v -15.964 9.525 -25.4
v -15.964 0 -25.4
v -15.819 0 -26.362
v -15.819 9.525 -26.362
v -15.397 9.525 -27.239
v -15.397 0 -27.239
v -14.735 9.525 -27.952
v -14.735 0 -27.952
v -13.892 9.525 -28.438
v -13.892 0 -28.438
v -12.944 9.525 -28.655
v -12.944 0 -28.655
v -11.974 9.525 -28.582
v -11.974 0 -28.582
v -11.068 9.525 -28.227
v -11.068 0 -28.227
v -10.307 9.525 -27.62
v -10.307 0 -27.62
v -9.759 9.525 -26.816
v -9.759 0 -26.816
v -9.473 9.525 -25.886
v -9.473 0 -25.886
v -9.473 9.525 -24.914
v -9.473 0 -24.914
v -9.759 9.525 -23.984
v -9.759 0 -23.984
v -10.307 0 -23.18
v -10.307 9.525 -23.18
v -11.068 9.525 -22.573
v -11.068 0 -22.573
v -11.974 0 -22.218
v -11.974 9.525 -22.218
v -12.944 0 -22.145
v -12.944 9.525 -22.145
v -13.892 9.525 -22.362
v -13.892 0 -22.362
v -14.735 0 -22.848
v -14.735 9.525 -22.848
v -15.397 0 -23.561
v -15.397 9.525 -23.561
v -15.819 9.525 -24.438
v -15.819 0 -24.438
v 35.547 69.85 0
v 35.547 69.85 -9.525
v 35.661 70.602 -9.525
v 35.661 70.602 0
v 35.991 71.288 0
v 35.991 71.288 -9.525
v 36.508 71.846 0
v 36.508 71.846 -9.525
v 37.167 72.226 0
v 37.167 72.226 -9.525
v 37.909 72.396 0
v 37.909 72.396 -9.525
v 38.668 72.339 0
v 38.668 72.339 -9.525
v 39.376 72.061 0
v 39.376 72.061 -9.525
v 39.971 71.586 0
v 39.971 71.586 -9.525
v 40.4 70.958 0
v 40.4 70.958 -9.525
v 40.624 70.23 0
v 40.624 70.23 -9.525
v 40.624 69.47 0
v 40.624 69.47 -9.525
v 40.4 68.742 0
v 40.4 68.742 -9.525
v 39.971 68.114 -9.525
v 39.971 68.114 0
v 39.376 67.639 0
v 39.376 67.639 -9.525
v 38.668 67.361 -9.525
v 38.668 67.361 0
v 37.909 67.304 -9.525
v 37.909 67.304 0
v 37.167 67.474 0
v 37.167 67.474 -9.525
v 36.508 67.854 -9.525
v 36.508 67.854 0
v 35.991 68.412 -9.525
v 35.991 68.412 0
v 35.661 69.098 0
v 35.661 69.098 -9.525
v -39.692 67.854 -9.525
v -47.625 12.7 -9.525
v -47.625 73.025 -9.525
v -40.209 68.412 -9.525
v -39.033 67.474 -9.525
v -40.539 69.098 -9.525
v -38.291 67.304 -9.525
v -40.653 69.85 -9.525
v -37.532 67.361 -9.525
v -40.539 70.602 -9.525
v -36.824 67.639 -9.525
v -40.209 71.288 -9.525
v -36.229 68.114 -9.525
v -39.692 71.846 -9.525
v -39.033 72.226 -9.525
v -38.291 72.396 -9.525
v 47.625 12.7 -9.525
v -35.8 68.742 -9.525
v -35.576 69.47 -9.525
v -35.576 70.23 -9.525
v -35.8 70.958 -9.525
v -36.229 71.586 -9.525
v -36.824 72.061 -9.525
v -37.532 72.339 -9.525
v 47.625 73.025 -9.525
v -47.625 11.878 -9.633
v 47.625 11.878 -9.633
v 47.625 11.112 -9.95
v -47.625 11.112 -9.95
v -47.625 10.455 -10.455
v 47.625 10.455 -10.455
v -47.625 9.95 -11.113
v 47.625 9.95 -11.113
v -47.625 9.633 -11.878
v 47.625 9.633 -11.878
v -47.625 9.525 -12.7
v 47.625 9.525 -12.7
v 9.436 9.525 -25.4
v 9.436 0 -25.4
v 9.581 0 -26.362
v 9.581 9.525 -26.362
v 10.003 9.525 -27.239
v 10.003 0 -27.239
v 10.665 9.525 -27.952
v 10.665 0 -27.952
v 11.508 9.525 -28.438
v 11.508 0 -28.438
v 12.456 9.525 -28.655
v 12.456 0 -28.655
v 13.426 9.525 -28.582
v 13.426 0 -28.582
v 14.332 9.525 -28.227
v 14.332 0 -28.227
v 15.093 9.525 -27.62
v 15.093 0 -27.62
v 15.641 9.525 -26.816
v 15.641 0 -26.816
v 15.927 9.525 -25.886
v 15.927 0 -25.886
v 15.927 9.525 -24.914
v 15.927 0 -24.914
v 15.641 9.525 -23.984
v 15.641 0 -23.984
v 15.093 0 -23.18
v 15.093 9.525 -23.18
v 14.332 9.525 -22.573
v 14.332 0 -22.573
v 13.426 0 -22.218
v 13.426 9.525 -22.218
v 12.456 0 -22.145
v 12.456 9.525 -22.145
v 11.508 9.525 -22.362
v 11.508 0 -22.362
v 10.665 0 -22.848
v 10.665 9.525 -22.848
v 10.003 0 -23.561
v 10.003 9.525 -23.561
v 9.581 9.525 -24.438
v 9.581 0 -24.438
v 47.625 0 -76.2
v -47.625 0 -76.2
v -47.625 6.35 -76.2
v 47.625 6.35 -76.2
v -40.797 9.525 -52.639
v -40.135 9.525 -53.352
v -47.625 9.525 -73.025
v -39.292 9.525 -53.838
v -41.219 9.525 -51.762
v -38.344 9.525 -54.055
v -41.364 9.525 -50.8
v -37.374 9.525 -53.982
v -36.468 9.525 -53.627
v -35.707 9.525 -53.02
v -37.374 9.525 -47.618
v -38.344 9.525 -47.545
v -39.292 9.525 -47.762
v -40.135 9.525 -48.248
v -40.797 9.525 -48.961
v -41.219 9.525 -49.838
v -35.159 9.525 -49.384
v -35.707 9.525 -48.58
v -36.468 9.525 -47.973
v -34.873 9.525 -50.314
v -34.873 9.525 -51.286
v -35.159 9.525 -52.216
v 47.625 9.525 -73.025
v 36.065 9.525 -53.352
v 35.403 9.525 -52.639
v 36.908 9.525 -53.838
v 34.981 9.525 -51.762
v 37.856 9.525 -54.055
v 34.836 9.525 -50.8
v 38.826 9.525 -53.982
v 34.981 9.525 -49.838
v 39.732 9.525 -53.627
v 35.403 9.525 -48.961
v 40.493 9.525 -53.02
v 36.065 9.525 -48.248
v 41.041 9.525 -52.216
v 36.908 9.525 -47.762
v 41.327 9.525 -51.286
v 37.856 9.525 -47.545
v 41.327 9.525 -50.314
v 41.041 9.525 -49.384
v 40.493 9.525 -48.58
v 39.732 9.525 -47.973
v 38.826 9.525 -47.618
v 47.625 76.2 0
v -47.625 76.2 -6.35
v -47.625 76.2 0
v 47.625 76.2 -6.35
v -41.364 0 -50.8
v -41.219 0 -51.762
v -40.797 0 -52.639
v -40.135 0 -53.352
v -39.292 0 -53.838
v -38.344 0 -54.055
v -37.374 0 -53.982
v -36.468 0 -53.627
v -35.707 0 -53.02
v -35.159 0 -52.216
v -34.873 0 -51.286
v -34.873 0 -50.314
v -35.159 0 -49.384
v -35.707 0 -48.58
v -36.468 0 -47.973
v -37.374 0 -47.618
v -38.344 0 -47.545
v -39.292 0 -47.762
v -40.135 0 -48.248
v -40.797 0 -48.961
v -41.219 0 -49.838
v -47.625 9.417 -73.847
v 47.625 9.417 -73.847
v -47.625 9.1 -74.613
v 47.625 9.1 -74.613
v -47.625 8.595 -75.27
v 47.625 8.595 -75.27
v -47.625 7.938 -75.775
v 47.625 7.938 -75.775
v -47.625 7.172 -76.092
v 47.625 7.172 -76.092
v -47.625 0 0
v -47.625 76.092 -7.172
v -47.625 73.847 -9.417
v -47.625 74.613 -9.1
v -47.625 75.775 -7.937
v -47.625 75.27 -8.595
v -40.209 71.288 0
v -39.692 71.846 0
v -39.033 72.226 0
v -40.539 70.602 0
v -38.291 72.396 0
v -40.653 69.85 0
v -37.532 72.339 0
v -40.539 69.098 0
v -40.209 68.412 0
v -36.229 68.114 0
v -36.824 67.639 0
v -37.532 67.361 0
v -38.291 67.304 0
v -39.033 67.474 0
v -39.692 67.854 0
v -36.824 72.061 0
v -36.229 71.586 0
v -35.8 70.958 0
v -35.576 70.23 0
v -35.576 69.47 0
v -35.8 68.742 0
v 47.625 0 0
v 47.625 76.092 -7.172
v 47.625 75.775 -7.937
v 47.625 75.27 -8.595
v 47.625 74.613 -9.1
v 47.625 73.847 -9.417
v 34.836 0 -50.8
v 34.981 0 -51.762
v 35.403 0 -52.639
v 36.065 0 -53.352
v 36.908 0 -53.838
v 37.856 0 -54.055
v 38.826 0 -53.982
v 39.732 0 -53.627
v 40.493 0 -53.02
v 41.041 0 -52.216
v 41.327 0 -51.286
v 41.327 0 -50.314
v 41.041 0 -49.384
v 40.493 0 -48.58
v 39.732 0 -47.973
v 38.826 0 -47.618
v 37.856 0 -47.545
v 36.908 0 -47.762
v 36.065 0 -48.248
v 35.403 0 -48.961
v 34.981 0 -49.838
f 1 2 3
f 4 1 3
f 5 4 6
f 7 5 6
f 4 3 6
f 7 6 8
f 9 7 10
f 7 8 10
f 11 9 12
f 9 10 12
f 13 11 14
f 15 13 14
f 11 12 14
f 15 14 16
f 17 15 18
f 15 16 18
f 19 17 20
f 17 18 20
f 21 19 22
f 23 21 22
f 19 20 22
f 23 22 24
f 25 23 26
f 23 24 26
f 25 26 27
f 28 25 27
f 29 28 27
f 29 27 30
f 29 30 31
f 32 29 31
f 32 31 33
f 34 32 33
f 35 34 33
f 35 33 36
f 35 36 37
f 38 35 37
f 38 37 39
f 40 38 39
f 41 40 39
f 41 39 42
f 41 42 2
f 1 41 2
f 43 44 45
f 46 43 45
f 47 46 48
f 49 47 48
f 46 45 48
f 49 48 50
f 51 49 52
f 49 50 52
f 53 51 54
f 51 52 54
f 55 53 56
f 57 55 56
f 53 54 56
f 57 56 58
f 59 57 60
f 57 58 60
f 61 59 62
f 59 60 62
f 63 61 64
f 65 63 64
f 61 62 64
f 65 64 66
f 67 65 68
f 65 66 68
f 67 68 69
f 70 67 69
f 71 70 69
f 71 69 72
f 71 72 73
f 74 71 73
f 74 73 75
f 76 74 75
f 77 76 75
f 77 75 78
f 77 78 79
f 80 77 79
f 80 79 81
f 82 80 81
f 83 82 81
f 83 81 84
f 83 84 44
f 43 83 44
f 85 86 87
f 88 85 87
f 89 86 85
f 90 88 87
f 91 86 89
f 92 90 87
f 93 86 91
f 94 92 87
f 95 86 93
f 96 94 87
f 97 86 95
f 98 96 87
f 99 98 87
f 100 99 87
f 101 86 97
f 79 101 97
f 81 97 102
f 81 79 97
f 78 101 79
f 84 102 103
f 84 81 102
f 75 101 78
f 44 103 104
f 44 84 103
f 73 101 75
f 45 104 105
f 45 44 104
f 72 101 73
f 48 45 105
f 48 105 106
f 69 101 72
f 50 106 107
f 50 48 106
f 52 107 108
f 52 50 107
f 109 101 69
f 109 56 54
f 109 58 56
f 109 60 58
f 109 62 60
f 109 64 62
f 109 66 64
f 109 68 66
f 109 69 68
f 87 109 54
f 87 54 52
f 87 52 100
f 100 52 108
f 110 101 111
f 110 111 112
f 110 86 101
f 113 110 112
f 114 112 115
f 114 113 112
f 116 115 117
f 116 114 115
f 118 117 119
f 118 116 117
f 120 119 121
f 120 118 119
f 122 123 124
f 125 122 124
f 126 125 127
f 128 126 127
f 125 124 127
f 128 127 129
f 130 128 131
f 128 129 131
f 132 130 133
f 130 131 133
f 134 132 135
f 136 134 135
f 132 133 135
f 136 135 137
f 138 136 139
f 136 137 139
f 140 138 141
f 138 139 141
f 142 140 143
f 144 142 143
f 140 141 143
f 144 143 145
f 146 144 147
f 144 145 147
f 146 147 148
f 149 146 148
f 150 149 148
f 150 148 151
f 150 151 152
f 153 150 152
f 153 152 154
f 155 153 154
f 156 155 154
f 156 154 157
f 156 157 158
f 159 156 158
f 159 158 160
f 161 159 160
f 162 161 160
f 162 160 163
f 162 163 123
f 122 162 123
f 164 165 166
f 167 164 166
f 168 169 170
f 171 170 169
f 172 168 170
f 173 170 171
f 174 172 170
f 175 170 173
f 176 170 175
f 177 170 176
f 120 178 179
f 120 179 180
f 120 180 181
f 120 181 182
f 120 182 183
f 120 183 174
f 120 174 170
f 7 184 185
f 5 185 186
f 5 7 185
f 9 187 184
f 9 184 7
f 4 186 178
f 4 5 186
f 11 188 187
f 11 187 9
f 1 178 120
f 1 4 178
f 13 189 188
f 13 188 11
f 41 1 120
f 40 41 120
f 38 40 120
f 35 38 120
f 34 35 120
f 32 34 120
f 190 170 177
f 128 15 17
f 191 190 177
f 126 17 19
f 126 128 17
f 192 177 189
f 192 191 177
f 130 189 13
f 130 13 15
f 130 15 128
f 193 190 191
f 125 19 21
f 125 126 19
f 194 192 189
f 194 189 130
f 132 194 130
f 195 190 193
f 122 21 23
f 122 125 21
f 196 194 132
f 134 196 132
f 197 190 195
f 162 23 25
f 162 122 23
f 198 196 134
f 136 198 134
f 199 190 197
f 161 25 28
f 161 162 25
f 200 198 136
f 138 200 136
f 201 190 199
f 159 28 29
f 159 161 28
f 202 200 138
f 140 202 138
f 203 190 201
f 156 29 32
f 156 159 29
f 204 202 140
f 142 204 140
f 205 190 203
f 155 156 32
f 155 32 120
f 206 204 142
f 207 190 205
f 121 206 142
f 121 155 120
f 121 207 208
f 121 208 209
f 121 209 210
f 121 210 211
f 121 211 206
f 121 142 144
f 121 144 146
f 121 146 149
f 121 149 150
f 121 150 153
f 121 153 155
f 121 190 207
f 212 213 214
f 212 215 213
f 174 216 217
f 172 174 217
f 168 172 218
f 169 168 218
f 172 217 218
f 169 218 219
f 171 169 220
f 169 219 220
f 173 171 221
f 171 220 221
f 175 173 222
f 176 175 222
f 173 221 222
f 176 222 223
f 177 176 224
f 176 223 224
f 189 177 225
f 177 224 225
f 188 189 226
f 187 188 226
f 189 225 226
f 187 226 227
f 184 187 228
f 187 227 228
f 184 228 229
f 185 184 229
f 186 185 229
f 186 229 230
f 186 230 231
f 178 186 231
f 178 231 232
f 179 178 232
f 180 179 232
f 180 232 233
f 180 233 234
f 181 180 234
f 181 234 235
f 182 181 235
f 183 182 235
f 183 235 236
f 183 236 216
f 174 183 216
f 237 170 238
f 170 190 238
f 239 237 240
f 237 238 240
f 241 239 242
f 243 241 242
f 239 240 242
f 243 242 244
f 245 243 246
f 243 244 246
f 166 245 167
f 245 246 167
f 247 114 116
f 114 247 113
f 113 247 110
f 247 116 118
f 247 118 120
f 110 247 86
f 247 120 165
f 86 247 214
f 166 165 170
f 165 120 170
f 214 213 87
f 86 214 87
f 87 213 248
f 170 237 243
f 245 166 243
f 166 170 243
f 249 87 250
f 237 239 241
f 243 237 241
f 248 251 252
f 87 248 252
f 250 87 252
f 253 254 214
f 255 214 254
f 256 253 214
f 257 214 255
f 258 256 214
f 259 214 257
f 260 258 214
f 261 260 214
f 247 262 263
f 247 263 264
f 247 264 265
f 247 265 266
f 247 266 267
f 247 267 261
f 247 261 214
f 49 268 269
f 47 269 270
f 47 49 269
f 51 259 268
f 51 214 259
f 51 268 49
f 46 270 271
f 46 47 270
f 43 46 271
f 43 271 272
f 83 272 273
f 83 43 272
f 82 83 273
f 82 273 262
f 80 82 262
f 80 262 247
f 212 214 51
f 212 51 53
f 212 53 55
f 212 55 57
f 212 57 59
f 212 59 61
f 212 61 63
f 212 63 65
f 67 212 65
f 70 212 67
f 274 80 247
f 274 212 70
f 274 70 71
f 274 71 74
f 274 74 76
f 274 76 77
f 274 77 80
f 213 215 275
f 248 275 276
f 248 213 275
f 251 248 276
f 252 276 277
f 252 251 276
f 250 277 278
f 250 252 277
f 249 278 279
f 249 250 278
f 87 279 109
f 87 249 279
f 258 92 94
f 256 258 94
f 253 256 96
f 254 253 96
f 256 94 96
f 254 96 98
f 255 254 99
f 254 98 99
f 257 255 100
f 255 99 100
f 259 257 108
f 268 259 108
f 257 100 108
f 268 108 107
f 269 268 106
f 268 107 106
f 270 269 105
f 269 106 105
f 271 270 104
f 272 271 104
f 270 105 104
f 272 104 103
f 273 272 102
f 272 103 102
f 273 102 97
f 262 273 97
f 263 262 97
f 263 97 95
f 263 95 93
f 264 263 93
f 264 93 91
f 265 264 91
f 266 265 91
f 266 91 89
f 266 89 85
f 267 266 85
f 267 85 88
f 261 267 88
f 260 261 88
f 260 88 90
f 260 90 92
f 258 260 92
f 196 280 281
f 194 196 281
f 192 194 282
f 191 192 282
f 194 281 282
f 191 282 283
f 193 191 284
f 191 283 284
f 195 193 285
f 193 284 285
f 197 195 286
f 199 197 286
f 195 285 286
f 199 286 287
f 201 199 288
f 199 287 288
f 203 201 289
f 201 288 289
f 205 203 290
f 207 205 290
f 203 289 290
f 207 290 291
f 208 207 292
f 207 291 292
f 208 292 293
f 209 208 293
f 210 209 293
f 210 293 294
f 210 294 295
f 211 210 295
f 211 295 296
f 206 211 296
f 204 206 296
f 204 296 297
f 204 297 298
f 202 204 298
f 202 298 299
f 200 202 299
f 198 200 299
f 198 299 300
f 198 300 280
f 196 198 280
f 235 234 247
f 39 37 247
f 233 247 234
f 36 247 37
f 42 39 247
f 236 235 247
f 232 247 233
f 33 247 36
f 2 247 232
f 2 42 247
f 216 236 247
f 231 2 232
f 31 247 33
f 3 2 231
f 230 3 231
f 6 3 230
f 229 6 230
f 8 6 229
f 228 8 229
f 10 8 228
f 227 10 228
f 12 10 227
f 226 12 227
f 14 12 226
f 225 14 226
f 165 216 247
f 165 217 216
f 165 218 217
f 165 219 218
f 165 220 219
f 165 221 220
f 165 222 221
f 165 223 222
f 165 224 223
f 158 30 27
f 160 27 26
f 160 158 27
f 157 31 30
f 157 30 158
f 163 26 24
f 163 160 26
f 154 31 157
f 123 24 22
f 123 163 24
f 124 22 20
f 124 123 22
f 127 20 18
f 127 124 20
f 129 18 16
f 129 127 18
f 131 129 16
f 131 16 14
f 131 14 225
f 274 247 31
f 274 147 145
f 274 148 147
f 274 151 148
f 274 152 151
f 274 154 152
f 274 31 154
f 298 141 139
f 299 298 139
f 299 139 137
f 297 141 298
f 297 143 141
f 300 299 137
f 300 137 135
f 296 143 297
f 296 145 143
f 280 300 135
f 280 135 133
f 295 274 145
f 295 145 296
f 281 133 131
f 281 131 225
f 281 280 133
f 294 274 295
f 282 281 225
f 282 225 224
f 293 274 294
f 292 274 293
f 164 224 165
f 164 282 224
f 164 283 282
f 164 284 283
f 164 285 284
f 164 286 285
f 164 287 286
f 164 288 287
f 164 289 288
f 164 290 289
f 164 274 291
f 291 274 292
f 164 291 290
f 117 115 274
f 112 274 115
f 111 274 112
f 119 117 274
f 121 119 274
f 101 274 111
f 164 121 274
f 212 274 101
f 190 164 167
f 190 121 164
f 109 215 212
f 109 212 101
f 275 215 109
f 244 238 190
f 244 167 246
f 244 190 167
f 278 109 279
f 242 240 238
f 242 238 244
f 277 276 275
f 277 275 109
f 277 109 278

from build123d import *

# Parameters (mm, degrees)
BOSS_EXTRUDE1_DEPTH     = 47.625
FILLET1_R               = 3.175
F_1_4_20_TAPPED_HOLE1_D = 5.1054
F_1_4_CLEARANCE_HOLE1_D = 6.5278


with BuildPart() as part:
    # Sketch1 → Boss-Extrude1 (new, symmetric)
    with BuildSketch(Plane(origin=(0, 0, 0), x_dir=(0, 0, -1), z_dir=(1, 0, 0))):
        Polygon((0, 76.2), (0, 0), (76.2, 0), (76.2, 9.525), (9.525, 9.525), (9.525, 76.2), align=None)
    extrude(amount=BOSS_EXTRUDE1_DEPTH, both=True)

    # Fillet1
    fillet1_edges = [part.edges().sort_by_distance(p)[0] for p in [
        (0, 76.2, -9.525),
        (0, 9.525, -9.525),
        (0, 9.525, -76.2),
    ]]
    fillet(fillet1_edges, radius=FILLET1_R)

    # 1/4-20 Tapped Hole1 (through all)
    with Locations(Plane.XY):
        with Locations((-38.1, 69.85), (38.1, 69.85)):
            Hole(F_1_4_20_TAPPED_HOLE1_D / 2)

    # 1/4 Clearance Hole1 (through all)
    with Locations(Plane(origin=(0, 9.525, 0), x_dir=(1, 0, 0), z_dir=(0, 1, 0))):
        with Locations((-38.1, 50.8), (38.1, 50.8), (-12.7, 25.4), (12.7, 25.4)):
            Hole(F_1_4_CLEARANCE_HOLE1_D / 2)


solid = part.part
